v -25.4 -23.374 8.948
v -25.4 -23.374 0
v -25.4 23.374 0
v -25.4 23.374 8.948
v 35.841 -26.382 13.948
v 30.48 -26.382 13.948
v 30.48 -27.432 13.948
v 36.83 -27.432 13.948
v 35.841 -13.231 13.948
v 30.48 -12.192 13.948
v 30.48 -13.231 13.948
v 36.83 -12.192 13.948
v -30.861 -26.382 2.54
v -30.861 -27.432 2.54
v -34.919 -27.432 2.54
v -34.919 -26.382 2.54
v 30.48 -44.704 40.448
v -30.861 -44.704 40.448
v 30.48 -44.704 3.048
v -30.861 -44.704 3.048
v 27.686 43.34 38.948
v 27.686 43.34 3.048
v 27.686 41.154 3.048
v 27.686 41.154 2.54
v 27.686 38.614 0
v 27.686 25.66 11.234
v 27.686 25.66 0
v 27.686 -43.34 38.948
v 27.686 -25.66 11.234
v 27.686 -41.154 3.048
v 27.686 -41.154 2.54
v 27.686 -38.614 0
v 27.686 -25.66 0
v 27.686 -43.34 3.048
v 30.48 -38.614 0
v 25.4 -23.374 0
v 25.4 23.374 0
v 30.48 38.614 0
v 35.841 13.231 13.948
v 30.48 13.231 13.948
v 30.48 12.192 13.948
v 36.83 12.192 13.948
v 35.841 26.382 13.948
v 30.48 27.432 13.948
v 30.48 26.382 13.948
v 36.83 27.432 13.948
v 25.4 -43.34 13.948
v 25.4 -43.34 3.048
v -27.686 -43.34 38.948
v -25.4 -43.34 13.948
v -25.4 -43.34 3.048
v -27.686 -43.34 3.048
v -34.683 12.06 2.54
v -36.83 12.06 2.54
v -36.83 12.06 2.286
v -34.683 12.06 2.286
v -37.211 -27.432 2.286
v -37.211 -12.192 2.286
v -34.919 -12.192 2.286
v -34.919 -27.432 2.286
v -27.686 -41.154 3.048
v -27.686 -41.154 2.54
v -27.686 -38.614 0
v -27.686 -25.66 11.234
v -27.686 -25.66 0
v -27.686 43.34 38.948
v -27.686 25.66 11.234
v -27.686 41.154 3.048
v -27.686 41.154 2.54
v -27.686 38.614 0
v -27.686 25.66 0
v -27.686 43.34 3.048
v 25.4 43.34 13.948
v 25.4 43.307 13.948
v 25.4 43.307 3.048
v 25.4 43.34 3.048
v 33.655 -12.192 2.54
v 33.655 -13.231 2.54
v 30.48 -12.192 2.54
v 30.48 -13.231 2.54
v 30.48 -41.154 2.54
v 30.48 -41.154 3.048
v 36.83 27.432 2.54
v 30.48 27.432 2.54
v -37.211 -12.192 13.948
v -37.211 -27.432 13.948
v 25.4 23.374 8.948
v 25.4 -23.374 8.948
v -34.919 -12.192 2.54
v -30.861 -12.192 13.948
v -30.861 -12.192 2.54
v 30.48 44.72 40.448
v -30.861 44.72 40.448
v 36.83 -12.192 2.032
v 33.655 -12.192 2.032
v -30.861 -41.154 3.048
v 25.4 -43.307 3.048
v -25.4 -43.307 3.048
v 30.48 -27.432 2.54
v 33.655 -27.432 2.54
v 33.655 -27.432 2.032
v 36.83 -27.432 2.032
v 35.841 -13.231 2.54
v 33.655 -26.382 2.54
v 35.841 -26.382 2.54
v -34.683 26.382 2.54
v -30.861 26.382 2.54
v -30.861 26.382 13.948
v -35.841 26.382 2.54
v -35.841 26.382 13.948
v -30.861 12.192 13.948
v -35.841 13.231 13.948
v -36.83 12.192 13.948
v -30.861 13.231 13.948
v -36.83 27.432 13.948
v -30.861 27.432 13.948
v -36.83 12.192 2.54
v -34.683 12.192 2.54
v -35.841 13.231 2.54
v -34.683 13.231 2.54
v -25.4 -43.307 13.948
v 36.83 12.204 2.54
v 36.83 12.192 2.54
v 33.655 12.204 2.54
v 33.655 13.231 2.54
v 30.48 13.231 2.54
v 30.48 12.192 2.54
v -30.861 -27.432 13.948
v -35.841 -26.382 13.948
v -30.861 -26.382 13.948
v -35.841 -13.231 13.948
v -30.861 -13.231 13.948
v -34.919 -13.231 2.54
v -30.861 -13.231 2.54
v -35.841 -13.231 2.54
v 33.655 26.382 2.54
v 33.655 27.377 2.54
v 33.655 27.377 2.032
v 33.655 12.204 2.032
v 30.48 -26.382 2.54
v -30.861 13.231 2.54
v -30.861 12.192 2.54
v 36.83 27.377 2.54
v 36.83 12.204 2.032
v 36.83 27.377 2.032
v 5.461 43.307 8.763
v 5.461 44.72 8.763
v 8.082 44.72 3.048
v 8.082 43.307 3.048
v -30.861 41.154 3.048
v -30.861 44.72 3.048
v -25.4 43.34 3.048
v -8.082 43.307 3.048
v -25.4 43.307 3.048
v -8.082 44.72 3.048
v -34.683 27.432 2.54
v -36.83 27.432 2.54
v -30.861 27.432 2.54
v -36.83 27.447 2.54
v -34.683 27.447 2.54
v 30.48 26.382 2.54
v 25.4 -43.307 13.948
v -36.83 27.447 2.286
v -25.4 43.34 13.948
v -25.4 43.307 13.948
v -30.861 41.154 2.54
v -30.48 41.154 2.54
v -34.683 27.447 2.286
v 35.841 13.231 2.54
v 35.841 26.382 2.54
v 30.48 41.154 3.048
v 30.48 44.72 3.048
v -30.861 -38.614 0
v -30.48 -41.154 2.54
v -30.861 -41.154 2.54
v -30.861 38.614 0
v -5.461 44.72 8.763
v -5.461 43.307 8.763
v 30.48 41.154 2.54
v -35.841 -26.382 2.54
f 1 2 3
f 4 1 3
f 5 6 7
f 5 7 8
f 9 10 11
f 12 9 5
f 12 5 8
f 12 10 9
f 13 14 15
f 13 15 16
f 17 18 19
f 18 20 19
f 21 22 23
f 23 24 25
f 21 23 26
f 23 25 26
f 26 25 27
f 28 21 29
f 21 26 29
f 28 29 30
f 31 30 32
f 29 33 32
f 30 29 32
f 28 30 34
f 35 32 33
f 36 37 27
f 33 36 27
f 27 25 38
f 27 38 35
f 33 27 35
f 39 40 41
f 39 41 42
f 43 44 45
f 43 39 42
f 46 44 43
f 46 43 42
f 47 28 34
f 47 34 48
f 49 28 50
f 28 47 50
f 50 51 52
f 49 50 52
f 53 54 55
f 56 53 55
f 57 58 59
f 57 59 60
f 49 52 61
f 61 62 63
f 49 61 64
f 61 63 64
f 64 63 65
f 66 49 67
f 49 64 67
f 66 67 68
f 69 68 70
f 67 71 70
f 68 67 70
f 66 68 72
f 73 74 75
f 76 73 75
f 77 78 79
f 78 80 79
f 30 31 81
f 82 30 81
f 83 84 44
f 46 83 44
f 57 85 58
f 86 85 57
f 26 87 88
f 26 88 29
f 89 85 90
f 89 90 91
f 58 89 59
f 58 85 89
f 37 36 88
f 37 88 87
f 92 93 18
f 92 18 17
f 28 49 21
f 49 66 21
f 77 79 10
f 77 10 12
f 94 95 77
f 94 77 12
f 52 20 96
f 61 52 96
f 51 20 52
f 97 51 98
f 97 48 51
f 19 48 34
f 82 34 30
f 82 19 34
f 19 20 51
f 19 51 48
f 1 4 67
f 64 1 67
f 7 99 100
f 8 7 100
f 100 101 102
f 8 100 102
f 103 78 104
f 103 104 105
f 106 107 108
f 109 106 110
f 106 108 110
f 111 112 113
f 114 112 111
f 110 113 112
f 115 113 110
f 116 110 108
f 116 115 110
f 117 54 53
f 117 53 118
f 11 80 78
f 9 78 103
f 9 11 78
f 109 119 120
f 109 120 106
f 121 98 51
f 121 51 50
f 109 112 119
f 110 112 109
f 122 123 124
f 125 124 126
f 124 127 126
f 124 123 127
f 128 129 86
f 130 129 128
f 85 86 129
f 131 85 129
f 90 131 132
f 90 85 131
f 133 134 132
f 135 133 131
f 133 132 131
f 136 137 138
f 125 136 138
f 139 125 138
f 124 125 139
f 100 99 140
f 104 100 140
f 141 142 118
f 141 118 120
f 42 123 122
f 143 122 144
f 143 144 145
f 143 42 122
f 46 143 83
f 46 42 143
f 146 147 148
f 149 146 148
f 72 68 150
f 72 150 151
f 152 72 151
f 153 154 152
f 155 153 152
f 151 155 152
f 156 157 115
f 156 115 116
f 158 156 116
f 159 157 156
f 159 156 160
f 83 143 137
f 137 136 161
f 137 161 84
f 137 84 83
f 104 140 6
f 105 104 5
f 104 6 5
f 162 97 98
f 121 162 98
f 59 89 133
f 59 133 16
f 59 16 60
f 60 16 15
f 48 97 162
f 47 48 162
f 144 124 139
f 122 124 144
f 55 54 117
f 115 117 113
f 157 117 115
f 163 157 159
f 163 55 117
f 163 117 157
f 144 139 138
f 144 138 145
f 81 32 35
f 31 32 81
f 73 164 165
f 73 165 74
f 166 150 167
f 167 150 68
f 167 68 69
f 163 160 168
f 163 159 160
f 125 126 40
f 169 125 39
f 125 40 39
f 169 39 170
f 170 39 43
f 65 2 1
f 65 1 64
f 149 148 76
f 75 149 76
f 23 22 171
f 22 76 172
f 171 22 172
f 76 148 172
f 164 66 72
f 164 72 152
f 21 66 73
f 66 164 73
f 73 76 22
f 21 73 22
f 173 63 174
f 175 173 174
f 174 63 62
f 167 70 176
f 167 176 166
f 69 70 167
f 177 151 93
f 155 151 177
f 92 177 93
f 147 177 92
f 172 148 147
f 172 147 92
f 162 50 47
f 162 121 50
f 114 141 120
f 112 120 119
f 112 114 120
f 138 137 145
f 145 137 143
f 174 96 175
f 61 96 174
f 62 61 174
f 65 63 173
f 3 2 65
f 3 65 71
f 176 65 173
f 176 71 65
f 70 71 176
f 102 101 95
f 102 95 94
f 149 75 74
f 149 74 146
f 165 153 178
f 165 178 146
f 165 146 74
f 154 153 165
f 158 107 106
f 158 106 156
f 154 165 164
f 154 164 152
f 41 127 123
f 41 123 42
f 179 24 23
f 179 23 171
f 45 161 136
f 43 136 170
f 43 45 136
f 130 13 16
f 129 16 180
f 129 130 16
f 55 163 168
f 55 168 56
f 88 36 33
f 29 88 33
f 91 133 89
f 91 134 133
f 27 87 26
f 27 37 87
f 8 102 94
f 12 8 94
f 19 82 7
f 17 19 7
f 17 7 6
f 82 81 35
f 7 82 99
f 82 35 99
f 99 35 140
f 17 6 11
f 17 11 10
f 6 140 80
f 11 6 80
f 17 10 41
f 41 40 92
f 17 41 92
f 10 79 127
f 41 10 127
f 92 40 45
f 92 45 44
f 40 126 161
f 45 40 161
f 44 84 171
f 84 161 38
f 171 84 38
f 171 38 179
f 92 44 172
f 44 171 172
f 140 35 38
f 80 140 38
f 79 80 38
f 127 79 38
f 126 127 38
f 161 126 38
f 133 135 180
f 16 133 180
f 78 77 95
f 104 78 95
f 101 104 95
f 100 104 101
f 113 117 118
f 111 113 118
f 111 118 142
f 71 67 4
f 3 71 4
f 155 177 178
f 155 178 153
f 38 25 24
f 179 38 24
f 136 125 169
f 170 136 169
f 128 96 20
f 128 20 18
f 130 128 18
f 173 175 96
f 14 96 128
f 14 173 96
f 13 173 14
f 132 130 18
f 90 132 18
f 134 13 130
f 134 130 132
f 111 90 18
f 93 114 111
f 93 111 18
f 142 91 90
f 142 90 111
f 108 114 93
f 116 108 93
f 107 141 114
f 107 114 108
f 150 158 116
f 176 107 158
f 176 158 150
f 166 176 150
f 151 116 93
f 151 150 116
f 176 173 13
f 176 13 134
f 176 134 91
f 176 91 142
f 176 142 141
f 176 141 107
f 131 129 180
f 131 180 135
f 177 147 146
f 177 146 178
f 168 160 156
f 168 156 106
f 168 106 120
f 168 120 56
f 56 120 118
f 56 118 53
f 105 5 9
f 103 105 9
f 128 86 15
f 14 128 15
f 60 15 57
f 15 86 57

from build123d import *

# Parameters (mm, degrees)
F0_W          = 60.96
F0_H          = 91.44
F0_W_2        = 50.8
F0_H_2        = 86.614
F1_DEPTH      = 28.448
F3_DEPTH      = 25.4
F4_W          = 66.649839282
F4_H          = 6.9823637605
F5_DEPTH      = 3.048
F6_W          = 64.9686481762
F6_H          = 4.777956934
F7_DEPTH      = 3.048
F9_DEPTH      = 2.286
F10_W         = 99.848318845
F10_H         = 48.2080141082
F11_DEPTH     = 50.8
F13_T1_DEPTH  = 15.8581495789
F13_T3_DEPTH  = 15.8581495789
F13_T8_DEPTH  = 41.5121495789
F13_T13_DEPTH = 41.5121495789
F13_T18_DEPTH = 41.5121495789
F13_T23_DEPTH = 41.5121495789
F14_W         = 15.24
F14_H         = 23.368
F15_DEPTH     = 6.35
F16_W         = 5.3607832682
F16_H         = 13.1506472826
F17_DEPTH     = 25.909
F19_DEPTH     = 0.254
F20_DEPTH     = 0.254
F21_DEPTH     = 1.016
F22_W         = 3.175
F22_H         = 15.24
F22_H_2       = 15.425526537
F23_DEPTH     = 0.508
F24_W         = 3.175
F24_H         = 15.24
F24_H_2       = 15.1729788631
F25_DEPTH     = 0.508
F26_W         = 1.4869117904
F26_H         = 15.24
F26_H_2       = 15.1544166729
F27_DEPTH     = 0.508
F28_W         = 1.5113
F28_H         = 15.24
F28_W_2       = 1.492887156
F28_H_2       = 15.3870563954
F29_DEPTH     = 0.254
F30_DEPTH     = 0.381
F31_DEPTH     = 0.254
F32_W         = 105.9566885233
F32_H         = 116.2753328681
F33_DEPTH     = 14.5
F35_DEPTH     = 25
F36_DEPTH     = 1
F37_DEPTH     = 0.4
F38_DEPTH     = 0.4
F39_W         = 61.341
F39_H         = 89.424
F40_DEPTH     = 1.5
F41_T4_DEPTH  = 72.4640866379
F41_T9_DEPTH  = 72.4640866379


# Not quite as in the source:
# - a fillet or chamfer that OpenCascade refuses, or shapes differently, is made with other operations: its cross-section is extruded or revolved along the edge and cut away or added
# - a feature names something its author has since deleted; it is built from what else it names


with BuildPart() as f1:
    # F0 (on Top) → F1 (new body)
    with BuildSketch(Plane.XY):
        Rectangle(F0_W, F0_H)
        Rectangle(F0_W_2, F0_H_2, mode=Mode.SUBTRACT)
    extrude(amount=F1_DEPTH)

    # F2 (on face) → F3 (cut)
    with BuildSketch(Plane(origin=(0, 45.72, 0), x_dir=(-1, 0, 0), z_dir=(0, 1, 0))):
        Polygon((-9.4803553075, 0), (0, 0), (9.4803553075, 0), (5.461, 8.763), (-5.461, 8.763), align=None)
        Polygon((-9.4803553075, 28.448), (-5.461, 19.685), (5.461, 19.685), (9.4803553075, 28.448), (0, 28.448), align=None)
    extrude(amount=-F3_DEPTH, mode=Mode.SUBTRACT)

    # F4 (on Top) → F5 (cut)
    with BuildSketch(Plane.XY):
        with Locations((-0.1057945192, 44.6448102593)):
            Rectangle(F4_W, F4_H)
        with Locations((-0.1057945192, -44.6448102593)):
            Rectangle(F4_W, F4_H)
    extrude(amount=F5_DEPTH, mode=Mode.SUBTRACT)

    # F6 (on face) → F7 (cut)
    with BuildSketch(Plane.XY.offset(28.448)):
        with Locations((-2.0043240881, 43.331021533)):
            Rectangle(F6_W, F6_H)
        with Locations((-2.0043240881, -43.331021533)):
            Rectangle(F6_W, F6_H)
    extrude(amount=-F7_DEPTH, mode=Mode.SUBTRACT)

    # F8 (on face) → F9 (cut)
    with BuildSketch(Plane(origin=(25.4, 0, 0), x_dir=(0, -1, 0), z_dir=(-1, 0, 0))):
        Polygon((-43.0863499641, 0), (-41.1536283791, 0), (-25.9136283791, 0), (-25.9136283791, 30.48), (-41.1536283791, 30.48), (-43.0863499641, 30.48), align=None)
        Polygon((25.9136283791, 30.48), (25.9136283791, 0), (41.1536283791, 0), (43.0863499641, 0), (43.0863499641, 30.48), (41.1536283791, 30.48), align=None)
    extrude(amount=-F9_DEPTH, mode=Mode.SUBTRACT)

    # F10 (on Right) → F11 (cut)
    with BuildSketch(Plane.YZ):
        with Locations((1.7518345267, 13.4315635078)):
            Rectangle(F10_W, F10_H)
    extrude(amount=-F11_DEPTH, mode=Mode.SUBTRACT)

    # F12: F1 across plane


with BuildPart() as f1_1:
    add(f1.part)
    add(f1.part.mirror(Plane.YZ))

    # F13: chamfer of 2.54 on 12 edges, made by hand

    # F13_s2 → F13_t1 (cut)
    with BuildSketch(Plane.YZ.offset(-37.0120747894)):
        Polygon((38.402043066, 28.448), (40.942043066, 25.908), (40.942043066, 28.448), align=None)
        Polygon((38.6136283791, 0), (41.1536283791, 2.54), (41.1536283791, 0), align=None)
        Polygon((-40.942043066, 25.908), (-38.402043066, 28.448), (-40.942043066, 28.448), align=None)
        Polygon((-38.6136283791, 0), (-41.1536283791, 2.54), (-41.1536283791, 0), align=None)
    extrude(amount=F13_T1_DEPTH, mode=Mode.SUBTRACT)

    # F13_s4 → F13_t3 (cut)
    with BuildSketch(Plane.YZ.offset(21.1539252106)):
        Polygon((38.402043066, 28.448), (40.942043066, 25.908), (40.942043066, 28.448), align=None)
        Polygon((-40.942043066, 25.908), (-38.402043066, 28.448), (-40.942043066, 28.448), align=None)
        Polygon((-38.6136283791, 0), (-41.1536283791, 2.54), (-41.1536283791, 0), align=None)
        Polygon((38.6136283791, 0), (41.1536283791, 2.54), (41.1536283791, 0), align=None)
    extrude(amount=F13_T3_DEPTH, mode=Mode.SUBTRACT)


with BuildPart() as f13_tool6:
    # F13_s7 → F13_t8 (new body)
    with BuildSketch(Plane.XY.offset(-6.5320747894)):
        Polygon((25.4, 23.3736283791), (27.94, 25.9136283791), (25.4, 25.9136283791), align=None)
    extrude(amount=F13_T8_DEPTH)

    split(bisect_by=Plane.YZ.offset(27.686), keep=Keep.BOTTOM)


with BuildPart() as f1_2:
    add(f1_1.part)

    # F13_t5: cut F13_tool6
    add(f13_tool6.part, mode=Mode.SUBTRACT)


with BuildPart() as f13_tool11:
    # F13_s12 → F13_t13 (new body)
    with BuildSketch(Plane.XY.offset(34.9800747894)):
        Polygon((25.4, -23.3736283791), (27.94, -25.9136283791), (25.4, -25.9136283791), align=None)
    extrude(amount=-F13_T13_DEPTH)

    split(bisect_by=Plane.YZ.offset(27.686), keep=Keep.BOTTOM)


with BuildPart() as f1_3:
    add(f1_2.part)

    # F13_t10: cut F13_tool11
    add(f13_tool11.part, mode=Mode.SUBTRACT)


with BuildPart() as f13_tool16:
    # F13_s17 → F13_t18 (new body)
    with BuildSketch(Plane.XY.offset(-6.5320747894)):
        Polygon((-27.94, 25.9136283791), (-25.4, 23.3736283791), (-25.4, 25.9136283791), align=None)
    extrude(amount=F13_T18_DEPTH)

    split(bisect_by=Plane.YZ.offset(-27.686), keep=Keep.TOP)


with BuildPart() as f1_4:
    add(f1_3.part)

    # F13_t15: cut F13_tool16
    add(f13_tool16.part, mode=Mode.SUBTRACT)


with BuildPart() as f13_tool21:
    # F13_s22 → F13_t23 (new body)
    with BuildSketch(Plane.XY.offset(34.9800747894)):
        Polygon((-25.4, -23.3736283791), (-27.94, -25.9136283791), (-25.4, -25.9136283791), align=None)
    extrude(amount=-F13_T23_DEPTH)

    split(bisect_by=Plane.YZ.offset(-27.686), keep=Keep.TOP)


with BuildPart() as f1_5:
    add(f1_4.part)

    # F13_t20: cut F13_tool21
    add(f13_tool21.part, mode=Mode.SUBTRACT)

    # F14 (on face) → F15 (join)
    with BuildSketch(Plane.YZ.offset(30.48)):
        with Locations((-19.812, 14.224)):
            Rectangle(F14_W, F14_H)
        with Locations((19.812, 14.224)):
            Rectangle(F14_W, F14_H)
    extrude(amount=F15_DEPTH)

    # F16 (on face) → F17 (cut, through all)
    with BuildSketch(Plane.XY.offset(25.908)):
        with Locations((33.1603916341, -19.8066011071)):
            Rectangle(F16_W, F16_H)
        with Locations((33.1603916341, 19.8066011071)):
            Rectangle(F16_W, F16_H)
    extrude(amount=-F17_DEPTH, mode=Mode.SUBTRACT)

    # F18: F1 across plane


with BuildPart() as f1_6:
    add(f1_5.part)
    add(f1_5.part.mirror(Plane.YZ))

    # F19 (cut): faces of the model
    f19_faces = [f1_6.faces().sort_by_distance(p)[0] for p in [
        (26.543, -43.0863499641, 14.224),
        (-26.543, -43.0863499641, 14.224),
    ]]
    extrude(f19_faces, amount=-F19_DEPTH, mode=Mode.SUBTRACT)

    # F20 (cut): faces of the model
    f20_faces = [f1_6.faces().sort_by_distance(p)[0] for p in [
        (26.543, 43.0863499641, 14.224),
        (-26.543, 43.0863499641, 14.224),
    ]]
    extrude(f20_faces, amount=-F20_DEPTH, mode=Mode.SUBTRACT)

    # F21 (cut): a face of the model
    f21_faces = [f1_6.faces().sort_by_distance(p)[0] for p in [
        (0, -45.72, 14.224),
    ]]
    extrude(f21_faces, amount=-F21_DEPTH, mode=Mode.SUBTRACT)

    # F22 (on face) → F23 (join)
    with BuildSketch(Plane.XY.offset(25.908)):
        with Locations((-35.2425, 19.812)):
            Rectangle(F22_W, F22_H)
        with Locations((-35.2425, -19.7230628692)):
            Rectangle(F22_W, F22_H_2)
    extrude(amount=F23_DEPTH)

    # F24 (on face) → F25 (join)
    with BuildSketch(Plane(origin=(0, 0, 2.54), x_dir=(1, 0, 0), z_dir=(0, 0, -1))):
        with Locations((35.2425, 19.812)):
            Rectangle(F24_W, F24_H)
        with Locations((35.2425, -19.7903430089)):
            Rectangle(F24_W, F24_H_2)
    extrude(amount=F25_DEPTH)

    # F26 (on face) → F27 (join)
    with BuildSketch(Plane.XY.offset(25.908)):
        with Locations((36.0865441048, -19.812)):
            Rectangle(F26_W, F26_H)
        with Locations((36.0865441048, 19.7994005866)):
            Rectangle(F26_W, F26_H_2)
    extrude(amount=F27_DEPTH)

    # F28 (on face) → F29 (join)
    with BuildSketch(Plane(origin=(0, 0, 2.54), x_dir=(1, 0, 0), z_dir=(0, 0, -1))):
        with Locations((-36.07435, 19.812)):
            Rectangle(F28_W, F28_H)
        with Locations((-36.083556422, -19.7531366721)):
            Rectangle(F28_W_2, F28_H_2)
    extrude(amount=F29_DEPTH)

    # F30 (add): faces of the model
    f30_faces = [f1_6.faces().sort_by_distance(p)[0] for p in [
        (-30.48, 0.4258489378, 14.2172059936),
        (-35.3187, -19.812, 2.413),
        (-35.8407832682, -19.8066011071, 14.224),
        (-36.83, -19.8101053315, 14.3540262363),
    ]]
    extrude(f30_faces, amount=F30_DEPTH, dir=(-1, 0, 0))

    # F31 (add): a face of the model
    f31_faces = [f1_6.faces().sort_by_distance(p)[0] for p in [
        (-35.337112844, 19.7531366721, 2.413),
    ]]
    extrude(f31_faces, amount=F31_DEPTH)

    # F32 (on face) → F33 (cut)
    with BuildSketch(Plane.XY.offset(28.448)):
        with Locations((11.0789313912, -7.9427920282)):
            Rectangle(F32_W, F32_H)
    extrude(amount=-F33_DEPTH, mode=Mode.SUBTRACT)

    # F34 (on face) → F35 (join)
    with BuildSketch(Plane.XY.offset(13.948)):
        Polygon((-30.861, -27.432), (-30.861, -44.704), (30.48, -44.704), (30.48, -27.432), (30.48, -26.3819247484), (30.48, -13.2312774658), (30.48, -12.192), (30.48, 12.192), (30.48, 13.2312774658), (30.48, 26.3819247484), (30.48, 27.432), (30.48, 45.72), (-30.861, 45.72), (-30.861, 27.432), (-30.861, 26.3819247484), (-30.861, 13.2312774658), (-30.861, 12.192), (-30.861, -12.192), (-30.861, -13.2312774658), (-30.861, -26.3819247484), align=None)
        Polygon((-25.4, -43.3403499641), (-27.686, -43.3403499641), (-27.686, -25.6596283791), (-27.686, 25.6596283791), (-27.686, 43.3403499641), (-25.4, 43.3403499641), (25.4, 43.3403499641), (27.686, 43.3403499641), (27.686, 25.6596283791), (27.686, -25.6596283791), (27.686, -43.3403499641), (25.4, -43.3403499641), align=None, mode=Mode.SUBTRACT)
    extrude(amount=F35_DEPTH)

    # F36 (cut): a face of the model
    f36_faces = [f1_6.faces().sort_by_distance(p)[0] for p in [
        (-0.1974395314, 45.72, 21.5545051375),
    ]]
    extrude(f36_faces, amount=-F36_DEPTH, mode=Mode.SUBTRACT)

    # F37 (add): a face of the model
    f37_faces = [f1_6.faces().sort_by_distance(p)[0] for p in [
        (-35.083112844, 19.7531366721, 2.413),
    ]]
    extrude(f37_faces, amount=F37_DEPTH)

    # F38 (add): a face of the model
    f38_faces = [f1_6.faces().sort_by_distance(p)[0] for p in [
        (-35.3187, -19.812, 2.413),
    ]]
    extrude(f38_faces, amount=F38_DEPTH)

    # F39 (on face) → F40 (join)
    with BuildSketch(Plane.XY.offset(38.948)):
        with Locations((-0.1905, 0.008)):
            Rectangle(F39_W, F39_H)
    extrude(amount=F40_DEPTH)

    # F41: chamfer of 5 on 2 edges, made by hand


with BuildPart() as f41_tool2:
    # F41_s3 → F41_t4 (new body)
    with BuildSketch(Plane.XZ.offset(-36.2320433189)):
        Polygon((25.4, 8.948), (30.4, 13.948), (25.4, 13.948), align=None)
    extrude(amount=F41_T4_DEPTH)

    split(bisect_by=Plane.YZ.offset(27.686), keep=Keep.BOTTOM)


with BuildPart() as f1_7:
    add(f1_6.part)

    # F41_t1: cut F41_tool2
    add(f41_tool2.part, mode=Mode.SUBTRACT)


with BuildPart() as f41_tool7:
    # F41_s8 → F41_t9 (new body)
    with BuildSketch(Plane.XZ.offset(-36.2320433189)):
        Polygon((-25.4, 8.948), (-30.4, 13.948), (-25.4, 13.948), align=None)
    extrude(amount=F41_T9_DEPTH)

    split(bisect_by=Plane.YZ.offset(-27.686), keep=Keep.TOP)


with BuildPart() as f1_8:
    add(f1_7.part)

    # F41_t6: cut F41_tool7
    add(f41_tool7.part, mode=Mode.SUBTRACT)


solid = f1_8.part
